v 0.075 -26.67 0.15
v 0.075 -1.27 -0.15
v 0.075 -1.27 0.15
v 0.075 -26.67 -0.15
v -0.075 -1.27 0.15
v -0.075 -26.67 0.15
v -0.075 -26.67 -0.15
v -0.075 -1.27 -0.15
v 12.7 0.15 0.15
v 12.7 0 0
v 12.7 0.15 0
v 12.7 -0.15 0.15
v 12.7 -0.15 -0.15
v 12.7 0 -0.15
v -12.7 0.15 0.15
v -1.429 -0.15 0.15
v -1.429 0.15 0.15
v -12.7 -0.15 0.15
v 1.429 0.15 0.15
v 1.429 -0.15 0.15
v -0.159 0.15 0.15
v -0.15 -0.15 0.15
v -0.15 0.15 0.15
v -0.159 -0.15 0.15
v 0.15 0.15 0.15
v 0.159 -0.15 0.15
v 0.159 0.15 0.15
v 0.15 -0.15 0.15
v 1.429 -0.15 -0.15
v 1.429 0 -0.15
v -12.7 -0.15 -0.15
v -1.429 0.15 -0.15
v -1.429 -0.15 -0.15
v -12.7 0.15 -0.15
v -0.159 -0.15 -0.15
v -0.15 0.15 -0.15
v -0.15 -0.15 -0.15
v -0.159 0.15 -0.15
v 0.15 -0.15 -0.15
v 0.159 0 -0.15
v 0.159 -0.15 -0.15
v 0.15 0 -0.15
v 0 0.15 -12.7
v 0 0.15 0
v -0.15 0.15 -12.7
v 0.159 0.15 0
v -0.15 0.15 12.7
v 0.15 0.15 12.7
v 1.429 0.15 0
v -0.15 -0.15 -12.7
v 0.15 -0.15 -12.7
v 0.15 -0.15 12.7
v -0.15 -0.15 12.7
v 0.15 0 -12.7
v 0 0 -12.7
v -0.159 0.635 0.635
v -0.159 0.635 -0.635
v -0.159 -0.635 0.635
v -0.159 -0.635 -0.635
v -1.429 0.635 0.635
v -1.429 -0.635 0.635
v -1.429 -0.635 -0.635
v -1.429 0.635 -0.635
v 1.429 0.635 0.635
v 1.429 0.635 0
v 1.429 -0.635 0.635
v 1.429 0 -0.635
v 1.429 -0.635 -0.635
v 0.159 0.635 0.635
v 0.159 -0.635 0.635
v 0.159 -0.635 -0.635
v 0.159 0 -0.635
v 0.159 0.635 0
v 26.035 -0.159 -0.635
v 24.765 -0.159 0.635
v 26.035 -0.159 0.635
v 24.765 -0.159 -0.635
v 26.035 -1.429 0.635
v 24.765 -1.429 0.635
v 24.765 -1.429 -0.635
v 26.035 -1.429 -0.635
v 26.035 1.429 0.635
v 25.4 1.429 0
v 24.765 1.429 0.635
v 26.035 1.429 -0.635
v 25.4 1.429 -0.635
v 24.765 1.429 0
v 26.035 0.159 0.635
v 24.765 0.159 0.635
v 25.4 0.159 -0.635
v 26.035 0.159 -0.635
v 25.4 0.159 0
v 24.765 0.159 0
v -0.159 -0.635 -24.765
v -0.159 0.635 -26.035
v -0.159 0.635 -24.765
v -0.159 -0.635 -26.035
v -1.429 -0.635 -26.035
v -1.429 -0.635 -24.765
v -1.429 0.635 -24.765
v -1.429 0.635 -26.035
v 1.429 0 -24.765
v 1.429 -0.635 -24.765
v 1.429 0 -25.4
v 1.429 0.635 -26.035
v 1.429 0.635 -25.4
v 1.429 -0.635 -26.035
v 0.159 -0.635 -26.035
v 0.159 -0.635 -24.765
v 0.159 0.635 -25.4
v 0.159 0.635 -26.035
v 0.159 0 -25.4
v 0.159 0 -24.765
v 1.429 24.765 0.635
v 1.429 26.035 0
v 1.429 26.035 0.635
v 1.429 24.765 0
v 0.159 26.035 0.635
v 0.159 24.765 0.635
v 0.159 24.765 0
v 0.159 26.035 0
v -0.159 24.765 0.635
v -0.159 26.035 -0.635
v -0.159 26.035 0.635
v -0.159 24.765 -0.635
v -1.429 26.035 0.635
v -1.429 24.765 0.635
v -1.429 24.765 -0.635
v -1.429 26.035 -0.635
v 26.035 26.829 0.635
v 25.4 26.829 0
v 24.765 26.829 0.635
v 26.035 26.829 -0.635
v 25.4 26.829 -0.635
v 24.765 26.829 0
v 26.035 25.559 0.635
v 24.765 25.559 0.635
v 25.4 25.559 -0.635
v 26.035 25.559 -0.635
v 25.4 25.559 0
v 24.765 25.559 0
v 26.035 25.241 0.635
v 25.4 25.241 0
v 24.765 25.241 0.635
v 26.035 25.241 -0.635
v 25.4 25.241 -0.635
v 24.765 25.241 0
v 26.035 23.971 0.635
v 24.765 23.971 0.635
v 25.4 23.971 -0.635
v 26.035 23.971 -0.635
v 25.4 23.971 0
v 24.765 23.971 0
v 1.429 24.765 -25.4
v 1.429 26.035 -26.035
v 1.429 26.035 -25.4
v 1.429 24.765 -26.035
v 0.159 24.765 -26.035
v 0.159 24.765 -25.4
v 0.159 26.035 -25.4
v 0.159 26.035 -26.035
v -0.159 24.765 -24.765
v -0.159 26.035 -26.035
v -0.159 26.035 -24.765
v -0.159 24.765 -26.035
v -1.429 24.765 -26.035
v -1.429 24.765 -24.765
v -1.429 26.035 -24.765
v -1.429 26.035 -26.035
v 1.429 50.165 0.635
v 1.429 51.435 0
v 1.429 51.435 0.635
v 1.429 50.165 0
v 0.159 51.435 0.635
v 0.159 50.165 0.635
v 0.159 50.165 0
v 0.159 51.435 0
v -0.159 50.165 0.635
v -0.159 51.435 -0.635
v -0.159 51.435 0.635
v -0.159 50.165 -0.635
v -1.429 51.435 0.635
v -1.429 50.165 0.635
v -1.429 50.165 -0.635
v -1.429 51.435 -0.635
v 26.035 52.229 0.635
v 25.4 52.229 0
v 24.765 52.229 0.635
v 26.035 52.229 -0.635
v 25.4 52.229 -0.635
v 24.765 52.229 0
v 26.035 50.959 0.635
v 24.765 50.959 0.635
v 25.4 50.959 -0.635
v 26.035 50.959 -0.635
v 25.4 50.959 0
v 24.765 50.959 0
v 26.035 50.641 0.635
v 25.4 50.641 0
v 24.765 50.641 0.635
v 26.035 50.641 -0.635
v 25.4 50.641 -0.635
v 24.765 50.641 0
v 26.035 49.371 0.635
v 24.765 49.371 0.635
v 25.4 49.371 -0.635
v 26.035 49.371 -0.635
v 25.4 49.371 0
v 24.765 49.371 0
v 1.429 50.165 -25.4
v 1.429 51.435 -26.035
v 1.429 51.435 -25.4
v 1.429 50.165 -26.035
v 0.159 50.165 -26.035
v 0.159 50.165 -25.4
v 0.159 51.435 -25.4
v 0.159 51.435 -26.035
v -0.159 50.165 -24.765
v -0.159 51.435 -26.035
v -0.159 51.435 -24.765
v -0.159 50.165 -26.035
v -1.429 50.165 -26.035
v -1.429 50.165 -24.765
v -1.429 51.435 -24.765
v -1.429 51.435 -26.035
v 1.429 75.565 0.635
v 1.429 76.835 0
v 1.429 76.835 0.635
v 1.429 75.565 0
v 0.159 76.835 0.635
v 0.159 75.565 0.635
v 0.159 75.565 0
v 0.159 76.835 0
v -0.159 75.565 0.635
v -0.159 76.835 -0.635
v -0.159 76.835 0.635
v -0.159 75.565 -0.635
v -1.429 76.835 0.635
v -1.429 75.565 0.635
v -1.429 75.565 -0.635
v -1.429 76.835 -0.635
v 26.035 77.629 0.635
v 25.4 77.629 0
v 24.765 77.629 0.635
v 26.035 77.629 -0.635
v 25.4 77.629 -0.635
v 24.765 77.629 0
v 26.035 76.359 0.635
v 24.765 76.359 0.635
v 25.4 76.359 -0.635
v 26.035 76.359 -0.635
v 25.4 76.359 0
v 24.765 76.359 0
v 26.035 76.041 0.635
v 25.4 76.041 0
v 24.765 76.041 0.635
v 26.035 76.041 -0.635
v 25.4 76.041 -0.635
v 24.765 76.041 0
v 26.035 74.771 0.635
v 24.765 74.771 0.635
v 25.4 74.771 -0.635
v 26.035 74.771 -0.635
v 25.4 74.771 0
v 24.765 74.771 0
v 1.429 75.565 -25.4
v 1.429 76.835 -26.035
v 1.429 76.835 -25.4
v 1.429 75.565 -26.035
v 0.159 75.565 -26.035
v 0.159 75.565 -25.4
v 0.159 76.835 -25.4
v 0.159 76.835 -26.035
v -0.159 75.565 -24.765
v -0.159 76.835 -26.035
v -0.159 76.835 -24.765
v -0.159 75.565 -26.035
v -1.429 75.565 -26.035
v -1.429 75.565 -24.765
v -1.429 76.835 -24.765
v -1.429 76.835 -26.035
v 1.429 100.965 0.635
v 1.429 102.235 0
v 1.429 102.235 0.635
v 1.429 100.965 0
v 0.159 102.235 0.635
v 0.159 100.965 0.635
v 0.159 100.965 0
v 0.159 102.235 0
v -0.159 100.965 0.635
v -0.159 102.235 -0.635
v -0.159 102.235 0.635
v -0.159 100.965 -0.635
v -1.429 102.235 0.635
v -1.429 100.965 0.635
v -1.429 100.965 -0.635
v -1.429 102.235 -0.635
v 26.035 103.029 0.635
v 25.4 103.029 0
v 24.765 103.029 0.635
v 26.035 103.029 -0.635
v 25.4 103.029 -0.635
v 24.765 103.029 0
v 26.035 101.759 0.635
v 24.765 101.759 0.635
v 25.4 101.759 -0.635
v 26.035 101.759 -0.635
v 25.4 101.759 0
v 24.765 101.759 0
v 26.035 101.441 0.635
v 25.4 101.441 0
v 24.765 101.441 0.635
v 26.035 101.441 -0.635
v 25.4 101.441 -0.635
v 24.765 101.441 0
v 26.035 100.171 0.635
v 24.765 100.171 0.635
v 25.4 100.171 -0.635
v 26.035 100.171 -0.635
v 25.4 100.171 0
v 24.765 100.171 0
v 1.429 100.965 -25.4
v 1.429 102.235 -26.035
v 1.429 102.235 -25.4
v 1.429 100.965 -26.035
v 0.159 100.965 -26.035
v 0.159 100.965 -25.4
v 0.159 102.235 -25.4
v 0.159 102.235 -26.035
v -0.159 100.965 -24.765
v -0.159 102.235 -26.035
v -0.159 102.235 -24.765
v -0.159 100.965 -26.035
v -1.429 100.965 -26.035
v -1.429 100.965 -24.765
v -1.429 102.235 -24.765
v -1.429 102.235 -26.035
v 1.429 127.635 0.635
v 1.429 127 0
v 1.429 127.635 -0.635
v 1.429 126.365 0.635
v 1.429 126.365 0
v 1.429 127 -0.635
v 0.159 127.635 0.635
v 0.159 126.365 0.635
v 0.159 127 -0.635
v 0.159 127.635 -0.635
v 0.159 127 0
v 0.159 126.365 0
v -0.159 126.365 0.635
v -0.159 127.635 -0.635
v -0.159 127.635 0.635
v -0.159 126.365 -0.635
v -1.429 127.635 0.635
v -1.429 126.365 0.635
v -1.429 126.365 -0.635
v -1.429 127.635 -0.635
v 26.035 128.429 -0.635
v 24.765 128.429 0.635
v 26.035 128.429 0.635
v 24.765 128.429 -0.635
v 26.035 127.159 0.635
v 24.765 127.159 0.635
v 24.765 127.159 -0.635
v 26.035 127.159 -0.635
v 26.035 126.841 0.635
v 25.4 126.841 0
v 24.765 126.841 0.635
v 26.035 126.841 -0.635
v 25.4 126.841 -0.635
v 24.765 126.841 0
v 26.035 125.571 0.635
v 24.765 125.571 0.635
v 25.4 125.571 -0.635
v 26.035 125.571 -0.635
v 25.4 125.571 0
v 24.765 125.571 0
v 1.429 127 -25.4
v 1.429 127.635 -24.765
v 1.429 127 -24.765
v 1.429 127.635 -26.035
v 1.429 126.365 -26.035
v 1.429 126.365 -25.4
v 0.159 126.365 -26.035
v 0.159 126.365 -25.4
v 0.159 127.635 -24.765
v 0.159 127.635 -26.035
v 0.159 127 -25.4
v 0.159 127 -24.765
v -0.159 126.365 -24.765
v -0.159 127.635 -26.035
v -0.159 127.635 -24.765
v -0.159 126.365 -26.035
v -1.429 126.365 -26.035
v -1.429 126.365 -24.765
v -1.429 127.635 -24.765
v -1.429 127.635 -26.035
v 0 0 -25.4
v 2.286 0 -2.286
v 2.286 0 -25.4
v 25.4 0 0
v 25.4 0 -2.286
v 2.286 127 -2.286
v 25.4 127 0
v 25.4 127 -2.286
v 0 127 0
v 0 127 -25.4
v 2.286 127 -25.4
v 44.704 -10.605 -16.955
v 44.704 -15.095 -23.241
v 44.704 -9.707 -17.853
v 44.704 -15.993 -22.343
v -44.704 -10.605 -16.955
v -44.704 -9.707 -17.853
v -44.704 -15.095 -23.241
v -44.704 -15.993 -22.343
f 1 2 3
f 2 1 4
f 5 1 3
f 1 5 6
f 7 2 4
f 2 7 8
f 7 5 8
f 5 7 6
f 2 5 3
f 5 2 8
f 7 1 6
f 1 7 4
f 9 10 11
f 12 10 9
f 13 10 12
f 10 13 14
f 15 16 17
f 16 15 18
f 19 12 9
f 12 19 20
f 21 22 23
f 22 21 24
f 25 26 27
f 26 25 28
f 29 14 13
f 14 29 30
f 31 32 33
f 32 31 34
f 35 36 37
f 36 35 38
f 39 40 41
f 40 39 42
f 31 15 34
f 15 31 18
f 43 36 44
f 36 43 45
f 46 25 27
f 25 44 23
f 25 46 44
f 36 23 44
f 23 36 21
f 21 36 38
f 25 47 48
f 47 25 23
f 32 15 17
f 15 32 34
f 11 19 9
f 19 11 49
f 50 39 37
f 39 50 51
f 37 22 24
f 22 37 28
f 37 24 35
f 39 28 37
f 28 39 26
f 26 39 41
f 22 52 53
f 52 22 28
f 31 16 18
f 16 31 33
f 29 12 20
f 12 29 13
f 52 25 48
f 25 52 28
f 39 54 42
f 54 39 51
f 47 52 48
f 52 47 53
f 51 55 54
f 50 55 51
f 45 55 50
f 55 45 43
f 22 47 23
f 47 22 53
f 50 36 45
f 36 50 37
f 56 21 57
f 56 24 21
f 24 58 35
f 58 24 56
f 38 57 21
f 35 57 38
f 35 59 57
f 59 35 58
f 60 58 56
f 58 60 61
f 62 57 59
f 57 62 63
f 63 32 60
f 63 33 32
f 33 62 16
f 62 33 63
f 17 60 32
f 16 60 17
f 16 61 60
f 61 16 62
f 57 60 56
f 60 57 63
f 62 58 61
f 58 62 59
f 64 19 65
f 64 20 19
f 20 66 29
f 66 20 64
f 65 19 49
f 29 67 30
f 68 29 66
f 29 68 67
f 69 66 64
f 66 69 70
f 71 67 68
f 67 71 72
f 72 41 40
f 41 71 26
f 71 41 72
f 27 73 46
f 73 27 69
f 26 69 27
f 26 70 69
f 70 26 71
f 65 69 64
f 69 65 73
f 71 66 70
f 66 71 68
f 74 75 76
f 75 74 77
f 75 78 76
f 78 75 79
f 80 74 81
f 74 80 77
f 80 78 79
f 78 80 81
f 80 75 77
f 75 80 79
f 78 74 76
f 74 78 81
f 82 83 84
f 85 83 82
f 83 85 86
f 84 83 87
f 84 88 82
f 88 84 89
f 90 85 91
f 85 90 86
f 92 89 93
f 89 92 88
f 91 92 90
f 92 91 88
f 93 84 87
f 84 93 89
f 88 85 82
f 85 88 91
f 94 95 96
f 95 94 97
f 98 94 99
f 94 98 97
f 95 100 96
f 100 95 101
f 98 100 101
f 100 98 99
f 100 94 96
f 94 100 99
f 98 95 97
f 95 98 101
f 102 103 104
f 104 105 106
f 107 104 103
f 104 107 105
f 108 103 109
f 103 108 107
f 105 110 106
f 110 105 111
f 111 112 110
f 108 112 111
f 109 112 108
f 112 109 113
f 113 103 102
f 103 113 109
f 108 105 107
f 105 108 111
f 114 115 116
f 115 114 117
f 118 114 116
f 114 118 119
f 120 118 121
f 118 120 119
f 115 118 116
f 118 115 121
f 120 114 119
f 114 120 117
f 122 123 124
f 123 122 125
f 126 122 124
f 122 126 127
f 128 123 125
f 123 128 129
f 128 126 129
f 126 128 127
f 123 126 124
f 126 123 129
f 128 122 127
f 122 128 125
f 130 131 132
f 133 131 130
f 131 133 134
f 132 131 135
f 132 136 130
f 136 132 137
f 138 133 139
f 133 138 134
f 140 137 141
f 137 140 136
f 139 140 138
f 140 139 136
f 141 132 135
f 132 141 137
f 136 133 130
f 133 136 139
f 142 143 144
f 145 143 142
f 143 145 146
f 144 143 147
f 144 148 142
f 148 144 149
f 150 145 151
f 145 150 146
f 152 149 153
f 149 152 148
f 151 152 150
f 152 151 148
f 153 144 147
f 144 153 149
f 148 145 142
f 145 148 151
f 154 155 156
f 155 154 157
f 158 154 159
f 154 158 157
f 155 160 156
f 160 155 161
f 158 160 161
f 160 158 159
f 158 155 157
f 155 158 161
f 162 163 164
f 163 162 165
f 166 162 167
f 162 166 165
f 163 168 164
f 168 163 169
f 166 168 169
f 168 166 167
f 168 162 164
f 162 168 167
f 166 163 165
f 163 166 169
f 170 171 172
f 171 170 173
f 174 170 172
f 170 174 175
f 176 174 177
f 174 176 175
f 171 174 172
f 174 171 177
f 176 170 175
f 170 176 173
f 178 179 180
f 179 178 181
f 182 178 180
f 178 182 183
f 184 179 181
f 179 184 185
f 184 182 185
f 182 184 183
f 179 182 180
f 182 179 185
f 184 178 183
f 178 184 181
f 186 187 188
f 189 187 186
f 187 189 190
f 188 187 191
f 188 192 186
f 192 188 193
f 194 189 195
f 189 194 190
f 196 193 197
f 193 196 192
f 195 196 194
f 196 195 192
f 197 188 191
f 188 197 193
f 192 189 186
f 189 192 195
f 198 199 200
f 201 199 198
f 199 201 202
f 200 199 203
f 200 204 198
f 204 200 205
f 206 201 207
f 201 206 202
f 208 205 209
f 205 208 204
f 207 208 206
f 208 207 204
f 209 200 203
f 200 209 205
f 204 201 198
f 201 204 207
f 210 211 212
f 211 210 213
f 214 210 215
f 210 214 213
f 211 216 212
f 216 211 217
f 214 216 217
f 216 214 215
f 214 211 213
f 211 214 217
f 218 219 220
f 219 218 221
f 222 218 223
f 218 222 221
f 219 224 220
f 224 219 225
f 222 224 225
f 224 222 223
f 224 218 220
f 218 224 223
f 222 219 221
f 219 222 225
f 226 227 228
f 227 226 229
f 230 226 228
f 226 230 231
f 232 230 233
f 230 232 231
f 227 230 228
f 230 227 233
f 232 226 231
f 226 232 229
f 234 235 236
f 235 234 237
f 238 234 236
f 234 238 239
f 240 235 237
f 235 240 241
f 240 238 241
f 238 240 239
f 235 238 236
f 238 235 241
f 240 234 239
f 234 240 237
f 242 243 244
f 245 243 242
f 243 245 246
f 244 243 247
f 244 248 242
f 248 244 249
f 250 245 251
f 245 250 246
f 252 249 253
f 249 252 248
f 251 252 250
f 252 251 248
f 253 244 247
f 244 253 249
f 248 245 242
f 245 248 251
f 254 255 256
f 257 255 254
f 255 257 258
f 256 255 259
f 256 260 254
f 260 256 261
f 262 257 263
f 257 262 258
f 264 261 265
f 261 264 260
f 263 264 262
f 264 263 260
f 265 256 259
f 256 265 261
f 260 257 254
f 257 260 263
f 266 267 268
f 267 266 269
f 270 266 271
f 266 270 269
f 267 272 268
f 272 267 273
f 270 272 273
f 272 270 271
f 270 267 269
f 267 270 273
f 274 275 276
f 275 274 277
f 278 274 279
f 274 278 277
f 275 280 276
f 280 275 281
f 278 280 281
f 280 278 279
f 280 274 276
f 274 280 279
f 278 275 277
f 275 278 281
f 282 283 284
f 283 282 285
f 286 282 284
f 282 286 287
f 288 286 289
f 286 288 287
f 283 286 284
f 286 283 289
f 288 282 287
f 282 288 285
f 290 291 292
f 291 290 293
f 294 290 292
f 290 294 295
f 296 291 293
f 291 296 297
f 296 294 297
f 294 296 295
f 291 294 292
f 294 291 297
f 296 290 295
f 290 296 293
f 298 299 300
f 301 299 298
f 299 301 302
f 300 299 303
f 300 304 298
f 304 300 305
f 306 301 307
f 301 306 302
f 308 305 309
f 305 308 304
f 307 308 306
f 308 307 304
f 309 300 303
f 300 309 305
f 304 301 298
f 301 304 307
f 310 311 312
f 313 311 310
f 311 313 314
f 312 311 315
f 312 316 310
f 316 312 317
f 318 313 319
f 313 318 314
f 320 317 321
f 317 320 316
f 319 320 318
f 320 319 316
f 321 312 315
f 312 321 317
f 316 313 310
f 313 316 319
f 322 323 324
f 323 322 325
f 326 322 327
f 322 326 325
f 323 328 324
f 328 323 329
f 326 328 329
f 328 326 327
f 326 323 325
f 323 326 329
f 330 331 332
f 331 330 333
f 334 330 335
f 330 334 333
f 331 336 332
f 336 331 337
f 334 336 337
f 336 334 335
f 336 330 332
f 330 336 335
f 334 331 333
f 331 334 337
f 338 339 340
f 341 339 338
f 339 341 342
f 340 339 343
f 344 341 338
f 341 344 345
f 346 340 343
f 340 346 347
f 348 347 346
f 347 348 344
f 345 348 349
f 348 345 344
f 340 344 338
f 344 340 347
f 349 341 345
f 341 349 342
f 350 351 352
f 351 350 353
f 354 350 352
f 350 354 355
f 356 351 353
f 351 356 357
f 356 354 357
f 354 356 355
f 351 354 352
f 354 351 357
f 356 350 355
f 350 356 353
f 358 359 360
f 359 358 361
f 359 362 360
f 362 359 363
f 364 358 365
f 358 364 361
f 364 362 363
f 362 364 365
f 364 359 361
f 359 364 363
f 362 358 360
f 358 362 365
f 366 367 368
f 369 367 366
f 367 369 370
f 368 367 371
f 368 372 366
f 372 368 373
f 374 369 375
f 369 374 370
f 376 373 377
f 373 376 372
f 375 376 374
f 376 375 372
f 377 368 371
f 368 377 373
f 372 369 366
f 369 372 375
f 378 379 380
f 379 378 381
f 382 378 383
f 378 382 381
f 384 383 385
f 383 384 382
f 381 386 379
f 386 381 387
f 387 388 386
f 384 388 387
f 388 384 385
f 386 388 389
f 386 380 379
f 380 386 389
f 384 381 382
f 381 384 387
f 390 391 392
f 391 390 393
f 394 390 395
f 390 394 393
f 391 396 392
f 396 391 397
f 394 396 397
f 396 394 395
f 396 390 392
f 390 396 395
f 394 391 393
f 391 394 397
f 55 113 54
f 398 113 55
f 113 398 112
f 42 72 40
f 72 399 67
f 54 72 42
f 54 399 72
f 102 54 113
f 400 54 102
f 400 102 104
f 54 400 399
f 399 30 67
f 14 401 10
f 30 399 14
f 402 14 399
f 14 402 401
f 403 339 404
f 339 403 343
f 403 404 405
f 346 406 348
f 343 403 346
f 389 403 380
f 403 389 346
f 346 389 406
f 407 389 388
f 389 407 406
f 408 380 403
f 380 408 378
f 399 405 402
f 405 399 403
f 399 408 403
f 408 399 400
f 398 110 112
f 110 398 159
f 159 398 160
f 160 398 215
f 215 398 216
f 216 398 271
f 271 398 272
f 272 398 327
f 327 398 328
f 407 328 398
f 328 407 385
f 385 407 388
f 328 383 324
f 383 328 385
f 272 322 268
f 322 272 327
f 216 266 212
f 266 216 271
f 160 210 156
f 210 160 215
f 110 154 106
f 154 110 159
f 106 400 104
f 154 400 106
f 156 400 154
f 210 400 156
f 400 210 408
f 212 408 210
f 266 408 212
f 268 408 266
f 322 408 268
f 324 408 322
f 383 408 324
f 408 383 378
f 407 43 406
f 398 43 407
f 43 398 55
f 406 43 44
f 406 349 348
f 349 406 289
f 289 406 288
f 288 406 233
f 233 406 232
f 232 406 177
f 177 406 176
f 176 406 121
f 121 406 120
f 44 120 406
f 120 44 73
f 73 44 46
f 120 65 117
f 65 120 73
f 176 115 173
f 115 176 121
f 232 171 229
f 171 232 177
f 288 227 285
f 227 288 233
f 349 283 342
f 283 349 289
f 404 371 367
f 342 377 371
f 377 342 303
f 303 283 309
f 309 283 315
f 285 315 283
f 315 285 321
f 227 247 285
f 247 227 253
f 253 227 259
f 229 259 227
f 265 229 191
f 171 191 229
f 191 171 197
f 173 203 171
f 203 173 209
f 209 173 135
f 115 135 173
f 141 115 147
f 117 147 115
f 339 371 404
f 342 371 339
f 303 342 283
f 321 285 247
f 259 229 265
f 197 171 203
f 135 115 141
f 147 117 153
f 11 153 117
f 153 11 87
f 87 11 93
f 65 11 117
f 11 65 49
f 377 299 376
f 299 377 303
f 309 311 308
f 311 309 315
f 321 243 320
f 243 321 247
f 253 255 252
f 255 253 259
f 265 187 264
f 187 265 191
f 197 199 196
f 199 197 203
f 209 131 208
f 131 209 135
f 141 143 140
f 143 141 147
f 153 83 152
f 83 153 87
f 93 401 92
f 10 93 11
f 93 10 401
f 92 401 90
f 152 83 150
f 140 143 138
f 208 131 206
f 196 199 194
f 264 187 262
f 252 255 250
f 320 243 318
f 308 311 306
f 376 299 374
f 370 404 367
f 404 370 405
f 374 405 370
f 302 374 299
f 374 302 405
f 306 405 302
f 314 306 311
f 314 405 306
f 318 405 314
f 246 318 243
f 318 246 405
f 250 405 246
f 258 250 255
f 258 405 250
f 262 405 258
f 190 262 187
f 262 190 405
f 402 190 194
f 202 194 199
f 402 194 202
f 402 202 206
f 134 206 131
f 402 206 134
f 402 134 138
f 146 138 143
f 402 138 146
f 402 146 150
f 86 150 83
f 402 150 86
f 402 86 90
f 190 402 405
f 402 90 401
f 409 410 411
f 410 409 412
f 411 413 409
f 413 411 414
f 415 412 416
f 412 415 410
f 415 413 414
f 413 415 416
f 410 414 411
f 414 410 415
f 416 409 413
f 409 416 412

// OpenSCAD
include <../mo/mo.scad>

// Spec[ 0 ] = length
// Spec[ 1 ] = Width
// Spec[ 2 ] = Height
// Spec[ 3 ] = Thickness
// Spec[ 4 ] = position spacing

// Pos[ 0 ] = section
// Pos[ 1 ] = position index

SectionPositionCount = 4;

module moRightAngleExtrusion( spec, p = 0, info = false ) {
  color( Aluminum ) {
    moPitch( 3 ) {
      linear_extrude( height = spec[ 0 ] ) {
        translate( [ spec[ 1 ] / 2, spec[ 2 ] / 2, 0 ] )
          difference() {
            square( [ spec[ 1 ], spec[ 2 ] ], center = true );
            translate( [ spec[ 3 ], spec[ 3 ], 0 ] ) 
              square( [ spec[ 1 ] - spec[ 3 ], spec[ 2 ] - spec[ 3 ] ], center = true );
          
        }
      }
    }
  }
  
  if ( info ) {
    moPartOrigin();
    for ( i = [ 0 : spec[ 0 ] / spec[ 4 ] ] )
      for ( j = [ 0 : SectionPositionCount - 1 ] ) {
        pi = [ i, j ];
        moMoveTo( moRightAngleExtrusionPosition( pi, spec ) )
          moPosition2( pi );
      }
  }
  
  if ( $name )
    moPartLabel( parent_module( 1 ) );

}

function moRightAngleExtrusionPositionSection( s, w, h, t ) = ( s == 0 ) ? [ [ 0, 0, 0 ], [ 0, 0, 1 ], 0 ] :
                                                            ( s == 1 ) ? [ [ w, 0, 0 ], [ 0, 0, 1 ], 90 ] :
                                                              [ [ 0, 0, -h ], [ 1, 0, 0 ], 90 ];

function moRightAngleExtrusionPosition( p = [0, 0 ], spec ) = moMoveToPosition( [ [ 0, p[0]*spec[4], 0 ], [ 1, 0, 0 ], 0 ], moRightAngleExtrusionPositionSection( p[ 1 ], spec[ 1 ], spec[ 2 ], spec[ 3 ] ) ); 

demoSpec = [ 5 * in, 1 * in, 1 * in, 0.06 * in, 1 * in ];

moMoveOriginTo( moRightAngleExtrusionPosition( [0,0], demoSpec ) )
  moRightAngleExtrusion( demoSpec, [0,0], info = true, $name=true );
